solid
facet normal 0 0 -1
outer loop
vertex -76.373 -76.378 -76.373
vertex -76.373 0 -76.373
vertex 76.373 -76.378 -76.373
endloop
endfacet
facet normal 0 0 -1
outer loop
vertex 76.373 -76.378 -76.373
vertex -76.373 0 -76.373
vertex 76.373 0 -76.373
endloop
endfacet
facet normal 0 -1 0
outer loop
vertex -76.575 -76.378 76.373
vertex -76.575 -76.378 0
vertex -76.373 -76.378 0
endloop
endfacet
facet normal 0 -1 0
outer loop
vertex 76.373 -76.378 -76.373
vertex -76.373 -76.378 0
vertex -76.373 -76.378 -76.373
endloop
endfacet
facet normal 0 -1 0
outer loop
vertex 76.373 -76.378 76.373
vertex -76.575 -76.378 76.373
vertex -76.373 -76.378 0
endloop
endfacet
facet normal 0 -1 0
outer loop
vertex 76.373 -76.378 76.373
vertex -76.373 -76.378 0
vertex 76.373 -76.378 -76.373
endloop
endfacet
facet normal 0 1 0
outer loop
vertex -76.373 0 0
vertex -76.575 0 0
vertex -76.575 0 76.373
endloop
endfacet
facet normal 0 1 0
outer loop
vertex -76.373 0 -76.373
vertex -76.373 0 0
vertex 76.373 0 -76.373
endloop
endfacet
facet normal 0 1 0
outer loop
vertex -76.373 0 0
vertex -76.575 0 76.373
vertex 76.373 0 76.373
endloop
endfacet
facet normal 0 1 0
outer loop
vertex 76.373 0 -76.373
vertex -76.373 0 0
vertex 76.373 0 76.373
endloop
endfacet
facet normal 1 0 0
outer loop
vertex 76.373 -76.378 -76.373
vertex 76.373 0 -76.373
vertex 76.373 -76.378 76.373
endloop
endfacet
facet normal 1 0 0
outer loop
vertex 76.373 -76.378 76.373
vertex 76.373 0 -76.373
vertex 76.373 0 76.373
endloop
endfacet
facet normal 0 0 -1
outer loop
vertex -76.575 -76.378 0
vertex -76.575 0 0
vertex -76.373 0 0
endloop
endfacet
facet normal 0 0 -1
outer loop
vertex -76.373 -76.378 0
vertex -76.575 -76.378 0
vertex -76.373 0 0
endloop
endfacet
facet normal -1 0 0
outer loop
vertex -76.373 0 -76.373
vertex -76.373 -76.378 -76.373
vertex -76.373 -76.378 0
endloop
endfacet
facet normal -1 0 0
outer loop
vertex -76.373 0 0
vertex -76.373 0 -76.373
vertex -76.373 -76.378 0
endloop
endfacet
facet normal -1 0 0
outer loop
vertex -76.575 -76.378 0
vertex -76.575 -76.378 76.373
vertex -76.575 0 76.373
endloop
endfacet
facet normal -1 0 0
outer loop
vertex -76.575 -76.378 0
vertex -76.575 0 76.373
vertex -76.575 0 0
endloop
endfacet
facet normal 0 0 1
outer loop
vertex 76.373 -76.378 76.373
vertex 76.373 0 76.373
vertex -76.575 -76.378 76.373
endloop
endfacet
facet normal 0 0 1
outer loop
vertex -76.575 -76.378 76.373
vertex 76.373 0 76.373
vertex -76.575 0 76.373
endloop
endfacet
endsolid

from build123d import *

# Parameters (mm, degrees)
F0_W     = 76.373182
F0_H     = 76.373182
F1_DEPTH = 76.3778


with BuildPart() as f1:
    # F0 (on Front) → F1 (new body)
    with BuildSketch(Plane.XZ):
        with Locations((38.186591, 38.186591)):
            Rectangle(F0_W, F0_H)
        Polygon((-76.373182, 0), (0, 0), (0, 76.373182), (-76.575227, 76.373182), (-76.575227, 0), align=None)
        with Locations((-38.186591, -38.186591)):
            Rectangle(F0_W, F0_H)
        with Locations((38.186591, -38.186591)):
            Rectangle(F0_W, F0_H)
    extrude(amount=F1_DEPTH)


solid = f1.part
